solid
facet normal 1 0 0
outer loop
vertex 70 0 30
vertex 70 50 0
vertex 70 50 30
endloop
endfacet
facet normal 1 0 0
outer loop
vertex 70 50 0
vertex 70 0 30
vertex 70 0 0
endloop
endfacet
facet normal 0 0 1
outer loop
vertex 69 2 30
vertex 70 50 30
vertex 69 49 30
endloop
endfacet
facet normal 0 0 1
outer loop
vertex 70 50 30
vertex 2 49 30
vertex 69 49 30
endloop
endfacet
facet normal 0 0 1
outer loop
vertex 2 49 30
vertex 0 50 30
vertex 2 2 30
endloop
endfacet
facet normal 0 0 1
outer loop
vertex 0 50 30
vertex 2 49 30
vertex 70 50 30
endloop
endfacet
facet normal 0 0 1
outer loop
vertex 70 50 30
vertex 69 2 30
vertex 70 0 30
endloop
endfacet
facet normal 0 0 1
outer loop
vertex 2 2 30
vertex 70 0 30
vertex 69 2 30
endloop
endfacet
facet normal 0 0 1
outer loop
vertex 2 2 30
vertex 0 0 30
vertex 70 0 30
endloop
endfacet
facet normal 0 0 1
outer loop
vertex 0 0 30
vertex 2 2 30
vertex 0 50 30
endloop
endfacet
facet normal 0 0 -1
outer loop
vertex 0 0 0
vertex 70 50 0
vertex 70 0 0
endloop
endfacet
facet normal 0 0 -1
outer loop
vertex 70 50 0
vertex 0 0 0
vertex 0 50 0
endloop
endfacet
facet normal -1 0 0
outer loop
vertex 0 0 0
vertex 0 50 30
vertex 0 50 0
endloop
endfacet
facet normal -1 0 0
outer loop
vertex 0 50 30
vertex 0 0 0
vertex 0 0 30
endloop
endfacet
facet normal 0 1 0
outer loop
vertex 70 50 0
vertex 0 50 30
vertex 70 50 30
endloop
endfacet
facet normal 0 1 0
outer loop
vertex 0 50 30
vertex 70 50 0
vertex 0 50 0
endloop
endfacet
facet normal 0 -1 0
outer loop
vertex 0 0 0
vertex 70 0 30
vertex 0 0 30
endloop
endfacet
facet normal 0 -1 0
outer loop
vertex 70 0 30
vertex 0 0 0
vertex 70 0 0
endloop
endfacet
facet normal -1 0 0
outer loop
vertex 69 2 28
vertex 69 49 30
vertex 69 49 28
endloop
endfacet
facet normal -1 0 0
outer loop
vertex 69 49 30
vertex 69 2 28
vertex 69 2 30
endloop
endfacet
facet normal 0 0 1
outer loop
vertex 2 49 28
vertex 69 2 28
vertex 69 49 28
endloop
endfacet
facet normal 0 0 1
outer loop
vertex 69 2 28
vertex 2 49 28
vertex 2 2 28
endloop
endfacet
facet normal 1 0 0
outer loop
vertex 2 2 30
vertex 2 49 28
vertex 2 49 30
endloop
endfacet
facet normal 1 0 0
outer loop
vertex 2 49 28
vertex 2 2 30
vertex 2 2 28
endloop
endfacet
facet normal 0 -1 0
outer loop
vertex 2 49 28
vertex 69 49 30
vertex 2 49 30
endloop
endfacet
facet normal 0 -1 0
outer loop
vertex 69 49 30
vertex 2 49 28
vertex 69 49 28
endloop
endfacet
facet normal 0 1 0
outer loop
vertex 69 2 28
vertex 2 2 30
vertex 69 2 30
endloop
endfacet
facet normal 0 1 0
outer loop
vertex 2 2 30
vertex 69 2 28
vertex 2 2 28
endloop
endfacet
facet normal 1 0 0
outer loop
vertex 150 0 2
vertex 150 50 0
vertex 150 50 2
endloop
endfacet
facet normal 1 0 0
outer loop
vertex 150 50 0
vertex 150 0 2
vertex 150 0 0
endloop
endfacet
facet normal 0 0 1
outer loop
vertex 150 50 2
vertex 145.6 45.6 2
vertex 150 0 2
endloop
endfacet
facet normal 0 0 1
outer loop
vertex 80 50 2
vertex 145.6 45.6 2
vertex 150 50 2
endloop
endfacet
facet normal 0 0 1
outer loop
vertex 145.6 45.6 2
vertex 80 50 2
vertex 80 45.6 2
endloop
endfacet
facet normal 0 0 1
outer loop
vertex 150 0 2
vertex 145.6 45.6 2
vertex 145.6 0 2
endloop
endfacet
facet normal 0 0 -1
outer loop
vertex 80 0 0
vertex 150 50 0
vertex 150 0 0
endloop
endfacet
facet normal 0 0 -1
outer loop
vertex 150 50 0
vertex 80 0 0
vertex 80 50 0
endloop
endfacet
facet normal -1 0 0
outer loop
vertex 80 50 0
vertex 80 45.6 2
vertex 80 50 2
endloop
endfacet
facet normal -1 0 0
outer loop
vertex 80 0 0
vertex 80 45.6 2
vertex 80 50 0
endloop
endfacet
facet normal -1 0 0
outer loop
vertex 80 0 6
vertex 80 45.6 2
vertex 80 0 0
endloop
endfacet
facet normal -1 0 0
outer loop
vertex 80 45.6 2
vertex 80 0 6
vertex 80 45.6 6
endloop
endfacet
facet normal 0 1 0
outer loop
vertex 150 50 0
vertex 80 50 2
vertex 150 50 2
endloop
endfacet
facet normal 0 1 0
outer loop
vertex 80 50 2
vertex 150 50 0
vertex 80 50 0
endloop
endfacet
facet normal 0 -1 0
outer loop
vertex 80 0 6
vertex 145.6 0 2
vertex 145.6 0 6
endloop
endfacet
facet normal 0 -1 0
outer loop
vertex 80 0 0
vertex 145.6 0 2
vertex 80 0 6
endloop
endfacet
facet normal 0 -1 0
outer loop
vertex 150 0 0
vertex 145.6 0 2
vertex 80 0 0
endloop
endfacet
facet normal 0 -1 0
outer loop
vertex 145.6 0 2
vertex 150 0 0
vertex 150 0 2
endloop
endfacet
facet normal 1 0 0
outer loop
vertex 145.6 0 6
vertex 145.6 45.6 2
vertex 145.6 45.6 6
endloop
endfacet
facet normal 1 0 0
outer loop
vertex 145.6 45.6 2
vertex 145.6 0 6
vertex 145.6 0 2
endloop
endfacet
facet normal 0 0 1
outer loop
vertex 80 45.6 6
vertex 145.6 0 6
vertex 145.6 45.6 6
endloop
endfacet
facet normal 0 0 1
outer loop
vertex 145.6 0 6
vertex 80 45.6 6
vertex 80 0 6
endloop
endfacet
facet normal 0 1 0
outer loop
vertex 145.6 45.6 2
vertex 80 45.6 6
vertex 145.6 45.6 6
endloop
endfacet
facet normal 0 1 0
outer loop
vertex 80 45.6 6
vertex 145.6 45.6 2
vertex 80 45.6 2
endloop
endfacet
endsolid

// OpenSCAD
// Two-part enclosure for a small electronics board (e.g. Arduino-based temperature logger)
// Print orientation: both parts lie on the bed (z = 0), side by side, with a 10 mm gap.
// The box is open-topped; the lid is printed upside down and slides into the box opening.
// Units: mm. No external libraries.

// ---------------- Parameters ----------------
box_x      = 70;    // outer length of box (X)
box_y      = 50;    // outer width of box (Y)
box_h      = 30;    // overall height of box (Z)
wall       = 2;     // wall thickness (X and Y)
floor      = 2;     // floor thickness under the board (Z)

lip_t      = 1.5;   // lip wall thickness (Z)
lip_h      = 4;     // lip height above the plate (Z)
lip_x      = 65.6;  // outer length of lip (X)
lip_y      = 45.6;  // outer width of lip (Y)
lip_over   = 0.2;   // clearance between lip outer size and box opening (each side)

gap        = 10;    // horizontal gap between box and lid (X)
eps        = 0.5;   // cutter overshoot past faces

$fn = 64;

// ---------------- Derived ----------------
box_i_x = box_x - 2 * wall;   // 66 mm inside length
box_i_y = box_y - 2 * wall;   // 46 mm inside width
lip_x1  = box_i_x - lip_over; // 65.8 mm (inner edge of lip aligns with box inner wall)
lip_x2  = box_i_x + lip_over; // 66.2 mm (outer edge of lip)

// ---------------- Model ----------------
union() {
    // Box: 2 mm walls, 2 mm floor, open top
    difference() {
        cube([box_x, box_y, box_h]);
        // open the top (cut down from z = box_h - floor)
        translate([wall, wall, box_h - floor])
            cube([box_i_x + 1, box_i_y + 1, floor + 1]);
    }

    // Lid: plate 70 x 50 x 2 mm with a centred rectangular lip on top, printed upside down
    translate([box_x + gap, 0, 0])
        difference() {
            union() {
                // base plate
                cube([box_x, box_y, 2]);
                // lip: wall 1.5 mm thick, 4 mm tall above the plate
                translate([0, 0, 2])
                    cube([lip_x, lip_y, lip_h]);
            }
            // cut the pocket the lip slides into (extends past the box top face)
            translate([wall, wall, box_h - floor])
                cube([box_i_x + 1, box_i_y + 1, floor + 1 + eps]);
        }
}
